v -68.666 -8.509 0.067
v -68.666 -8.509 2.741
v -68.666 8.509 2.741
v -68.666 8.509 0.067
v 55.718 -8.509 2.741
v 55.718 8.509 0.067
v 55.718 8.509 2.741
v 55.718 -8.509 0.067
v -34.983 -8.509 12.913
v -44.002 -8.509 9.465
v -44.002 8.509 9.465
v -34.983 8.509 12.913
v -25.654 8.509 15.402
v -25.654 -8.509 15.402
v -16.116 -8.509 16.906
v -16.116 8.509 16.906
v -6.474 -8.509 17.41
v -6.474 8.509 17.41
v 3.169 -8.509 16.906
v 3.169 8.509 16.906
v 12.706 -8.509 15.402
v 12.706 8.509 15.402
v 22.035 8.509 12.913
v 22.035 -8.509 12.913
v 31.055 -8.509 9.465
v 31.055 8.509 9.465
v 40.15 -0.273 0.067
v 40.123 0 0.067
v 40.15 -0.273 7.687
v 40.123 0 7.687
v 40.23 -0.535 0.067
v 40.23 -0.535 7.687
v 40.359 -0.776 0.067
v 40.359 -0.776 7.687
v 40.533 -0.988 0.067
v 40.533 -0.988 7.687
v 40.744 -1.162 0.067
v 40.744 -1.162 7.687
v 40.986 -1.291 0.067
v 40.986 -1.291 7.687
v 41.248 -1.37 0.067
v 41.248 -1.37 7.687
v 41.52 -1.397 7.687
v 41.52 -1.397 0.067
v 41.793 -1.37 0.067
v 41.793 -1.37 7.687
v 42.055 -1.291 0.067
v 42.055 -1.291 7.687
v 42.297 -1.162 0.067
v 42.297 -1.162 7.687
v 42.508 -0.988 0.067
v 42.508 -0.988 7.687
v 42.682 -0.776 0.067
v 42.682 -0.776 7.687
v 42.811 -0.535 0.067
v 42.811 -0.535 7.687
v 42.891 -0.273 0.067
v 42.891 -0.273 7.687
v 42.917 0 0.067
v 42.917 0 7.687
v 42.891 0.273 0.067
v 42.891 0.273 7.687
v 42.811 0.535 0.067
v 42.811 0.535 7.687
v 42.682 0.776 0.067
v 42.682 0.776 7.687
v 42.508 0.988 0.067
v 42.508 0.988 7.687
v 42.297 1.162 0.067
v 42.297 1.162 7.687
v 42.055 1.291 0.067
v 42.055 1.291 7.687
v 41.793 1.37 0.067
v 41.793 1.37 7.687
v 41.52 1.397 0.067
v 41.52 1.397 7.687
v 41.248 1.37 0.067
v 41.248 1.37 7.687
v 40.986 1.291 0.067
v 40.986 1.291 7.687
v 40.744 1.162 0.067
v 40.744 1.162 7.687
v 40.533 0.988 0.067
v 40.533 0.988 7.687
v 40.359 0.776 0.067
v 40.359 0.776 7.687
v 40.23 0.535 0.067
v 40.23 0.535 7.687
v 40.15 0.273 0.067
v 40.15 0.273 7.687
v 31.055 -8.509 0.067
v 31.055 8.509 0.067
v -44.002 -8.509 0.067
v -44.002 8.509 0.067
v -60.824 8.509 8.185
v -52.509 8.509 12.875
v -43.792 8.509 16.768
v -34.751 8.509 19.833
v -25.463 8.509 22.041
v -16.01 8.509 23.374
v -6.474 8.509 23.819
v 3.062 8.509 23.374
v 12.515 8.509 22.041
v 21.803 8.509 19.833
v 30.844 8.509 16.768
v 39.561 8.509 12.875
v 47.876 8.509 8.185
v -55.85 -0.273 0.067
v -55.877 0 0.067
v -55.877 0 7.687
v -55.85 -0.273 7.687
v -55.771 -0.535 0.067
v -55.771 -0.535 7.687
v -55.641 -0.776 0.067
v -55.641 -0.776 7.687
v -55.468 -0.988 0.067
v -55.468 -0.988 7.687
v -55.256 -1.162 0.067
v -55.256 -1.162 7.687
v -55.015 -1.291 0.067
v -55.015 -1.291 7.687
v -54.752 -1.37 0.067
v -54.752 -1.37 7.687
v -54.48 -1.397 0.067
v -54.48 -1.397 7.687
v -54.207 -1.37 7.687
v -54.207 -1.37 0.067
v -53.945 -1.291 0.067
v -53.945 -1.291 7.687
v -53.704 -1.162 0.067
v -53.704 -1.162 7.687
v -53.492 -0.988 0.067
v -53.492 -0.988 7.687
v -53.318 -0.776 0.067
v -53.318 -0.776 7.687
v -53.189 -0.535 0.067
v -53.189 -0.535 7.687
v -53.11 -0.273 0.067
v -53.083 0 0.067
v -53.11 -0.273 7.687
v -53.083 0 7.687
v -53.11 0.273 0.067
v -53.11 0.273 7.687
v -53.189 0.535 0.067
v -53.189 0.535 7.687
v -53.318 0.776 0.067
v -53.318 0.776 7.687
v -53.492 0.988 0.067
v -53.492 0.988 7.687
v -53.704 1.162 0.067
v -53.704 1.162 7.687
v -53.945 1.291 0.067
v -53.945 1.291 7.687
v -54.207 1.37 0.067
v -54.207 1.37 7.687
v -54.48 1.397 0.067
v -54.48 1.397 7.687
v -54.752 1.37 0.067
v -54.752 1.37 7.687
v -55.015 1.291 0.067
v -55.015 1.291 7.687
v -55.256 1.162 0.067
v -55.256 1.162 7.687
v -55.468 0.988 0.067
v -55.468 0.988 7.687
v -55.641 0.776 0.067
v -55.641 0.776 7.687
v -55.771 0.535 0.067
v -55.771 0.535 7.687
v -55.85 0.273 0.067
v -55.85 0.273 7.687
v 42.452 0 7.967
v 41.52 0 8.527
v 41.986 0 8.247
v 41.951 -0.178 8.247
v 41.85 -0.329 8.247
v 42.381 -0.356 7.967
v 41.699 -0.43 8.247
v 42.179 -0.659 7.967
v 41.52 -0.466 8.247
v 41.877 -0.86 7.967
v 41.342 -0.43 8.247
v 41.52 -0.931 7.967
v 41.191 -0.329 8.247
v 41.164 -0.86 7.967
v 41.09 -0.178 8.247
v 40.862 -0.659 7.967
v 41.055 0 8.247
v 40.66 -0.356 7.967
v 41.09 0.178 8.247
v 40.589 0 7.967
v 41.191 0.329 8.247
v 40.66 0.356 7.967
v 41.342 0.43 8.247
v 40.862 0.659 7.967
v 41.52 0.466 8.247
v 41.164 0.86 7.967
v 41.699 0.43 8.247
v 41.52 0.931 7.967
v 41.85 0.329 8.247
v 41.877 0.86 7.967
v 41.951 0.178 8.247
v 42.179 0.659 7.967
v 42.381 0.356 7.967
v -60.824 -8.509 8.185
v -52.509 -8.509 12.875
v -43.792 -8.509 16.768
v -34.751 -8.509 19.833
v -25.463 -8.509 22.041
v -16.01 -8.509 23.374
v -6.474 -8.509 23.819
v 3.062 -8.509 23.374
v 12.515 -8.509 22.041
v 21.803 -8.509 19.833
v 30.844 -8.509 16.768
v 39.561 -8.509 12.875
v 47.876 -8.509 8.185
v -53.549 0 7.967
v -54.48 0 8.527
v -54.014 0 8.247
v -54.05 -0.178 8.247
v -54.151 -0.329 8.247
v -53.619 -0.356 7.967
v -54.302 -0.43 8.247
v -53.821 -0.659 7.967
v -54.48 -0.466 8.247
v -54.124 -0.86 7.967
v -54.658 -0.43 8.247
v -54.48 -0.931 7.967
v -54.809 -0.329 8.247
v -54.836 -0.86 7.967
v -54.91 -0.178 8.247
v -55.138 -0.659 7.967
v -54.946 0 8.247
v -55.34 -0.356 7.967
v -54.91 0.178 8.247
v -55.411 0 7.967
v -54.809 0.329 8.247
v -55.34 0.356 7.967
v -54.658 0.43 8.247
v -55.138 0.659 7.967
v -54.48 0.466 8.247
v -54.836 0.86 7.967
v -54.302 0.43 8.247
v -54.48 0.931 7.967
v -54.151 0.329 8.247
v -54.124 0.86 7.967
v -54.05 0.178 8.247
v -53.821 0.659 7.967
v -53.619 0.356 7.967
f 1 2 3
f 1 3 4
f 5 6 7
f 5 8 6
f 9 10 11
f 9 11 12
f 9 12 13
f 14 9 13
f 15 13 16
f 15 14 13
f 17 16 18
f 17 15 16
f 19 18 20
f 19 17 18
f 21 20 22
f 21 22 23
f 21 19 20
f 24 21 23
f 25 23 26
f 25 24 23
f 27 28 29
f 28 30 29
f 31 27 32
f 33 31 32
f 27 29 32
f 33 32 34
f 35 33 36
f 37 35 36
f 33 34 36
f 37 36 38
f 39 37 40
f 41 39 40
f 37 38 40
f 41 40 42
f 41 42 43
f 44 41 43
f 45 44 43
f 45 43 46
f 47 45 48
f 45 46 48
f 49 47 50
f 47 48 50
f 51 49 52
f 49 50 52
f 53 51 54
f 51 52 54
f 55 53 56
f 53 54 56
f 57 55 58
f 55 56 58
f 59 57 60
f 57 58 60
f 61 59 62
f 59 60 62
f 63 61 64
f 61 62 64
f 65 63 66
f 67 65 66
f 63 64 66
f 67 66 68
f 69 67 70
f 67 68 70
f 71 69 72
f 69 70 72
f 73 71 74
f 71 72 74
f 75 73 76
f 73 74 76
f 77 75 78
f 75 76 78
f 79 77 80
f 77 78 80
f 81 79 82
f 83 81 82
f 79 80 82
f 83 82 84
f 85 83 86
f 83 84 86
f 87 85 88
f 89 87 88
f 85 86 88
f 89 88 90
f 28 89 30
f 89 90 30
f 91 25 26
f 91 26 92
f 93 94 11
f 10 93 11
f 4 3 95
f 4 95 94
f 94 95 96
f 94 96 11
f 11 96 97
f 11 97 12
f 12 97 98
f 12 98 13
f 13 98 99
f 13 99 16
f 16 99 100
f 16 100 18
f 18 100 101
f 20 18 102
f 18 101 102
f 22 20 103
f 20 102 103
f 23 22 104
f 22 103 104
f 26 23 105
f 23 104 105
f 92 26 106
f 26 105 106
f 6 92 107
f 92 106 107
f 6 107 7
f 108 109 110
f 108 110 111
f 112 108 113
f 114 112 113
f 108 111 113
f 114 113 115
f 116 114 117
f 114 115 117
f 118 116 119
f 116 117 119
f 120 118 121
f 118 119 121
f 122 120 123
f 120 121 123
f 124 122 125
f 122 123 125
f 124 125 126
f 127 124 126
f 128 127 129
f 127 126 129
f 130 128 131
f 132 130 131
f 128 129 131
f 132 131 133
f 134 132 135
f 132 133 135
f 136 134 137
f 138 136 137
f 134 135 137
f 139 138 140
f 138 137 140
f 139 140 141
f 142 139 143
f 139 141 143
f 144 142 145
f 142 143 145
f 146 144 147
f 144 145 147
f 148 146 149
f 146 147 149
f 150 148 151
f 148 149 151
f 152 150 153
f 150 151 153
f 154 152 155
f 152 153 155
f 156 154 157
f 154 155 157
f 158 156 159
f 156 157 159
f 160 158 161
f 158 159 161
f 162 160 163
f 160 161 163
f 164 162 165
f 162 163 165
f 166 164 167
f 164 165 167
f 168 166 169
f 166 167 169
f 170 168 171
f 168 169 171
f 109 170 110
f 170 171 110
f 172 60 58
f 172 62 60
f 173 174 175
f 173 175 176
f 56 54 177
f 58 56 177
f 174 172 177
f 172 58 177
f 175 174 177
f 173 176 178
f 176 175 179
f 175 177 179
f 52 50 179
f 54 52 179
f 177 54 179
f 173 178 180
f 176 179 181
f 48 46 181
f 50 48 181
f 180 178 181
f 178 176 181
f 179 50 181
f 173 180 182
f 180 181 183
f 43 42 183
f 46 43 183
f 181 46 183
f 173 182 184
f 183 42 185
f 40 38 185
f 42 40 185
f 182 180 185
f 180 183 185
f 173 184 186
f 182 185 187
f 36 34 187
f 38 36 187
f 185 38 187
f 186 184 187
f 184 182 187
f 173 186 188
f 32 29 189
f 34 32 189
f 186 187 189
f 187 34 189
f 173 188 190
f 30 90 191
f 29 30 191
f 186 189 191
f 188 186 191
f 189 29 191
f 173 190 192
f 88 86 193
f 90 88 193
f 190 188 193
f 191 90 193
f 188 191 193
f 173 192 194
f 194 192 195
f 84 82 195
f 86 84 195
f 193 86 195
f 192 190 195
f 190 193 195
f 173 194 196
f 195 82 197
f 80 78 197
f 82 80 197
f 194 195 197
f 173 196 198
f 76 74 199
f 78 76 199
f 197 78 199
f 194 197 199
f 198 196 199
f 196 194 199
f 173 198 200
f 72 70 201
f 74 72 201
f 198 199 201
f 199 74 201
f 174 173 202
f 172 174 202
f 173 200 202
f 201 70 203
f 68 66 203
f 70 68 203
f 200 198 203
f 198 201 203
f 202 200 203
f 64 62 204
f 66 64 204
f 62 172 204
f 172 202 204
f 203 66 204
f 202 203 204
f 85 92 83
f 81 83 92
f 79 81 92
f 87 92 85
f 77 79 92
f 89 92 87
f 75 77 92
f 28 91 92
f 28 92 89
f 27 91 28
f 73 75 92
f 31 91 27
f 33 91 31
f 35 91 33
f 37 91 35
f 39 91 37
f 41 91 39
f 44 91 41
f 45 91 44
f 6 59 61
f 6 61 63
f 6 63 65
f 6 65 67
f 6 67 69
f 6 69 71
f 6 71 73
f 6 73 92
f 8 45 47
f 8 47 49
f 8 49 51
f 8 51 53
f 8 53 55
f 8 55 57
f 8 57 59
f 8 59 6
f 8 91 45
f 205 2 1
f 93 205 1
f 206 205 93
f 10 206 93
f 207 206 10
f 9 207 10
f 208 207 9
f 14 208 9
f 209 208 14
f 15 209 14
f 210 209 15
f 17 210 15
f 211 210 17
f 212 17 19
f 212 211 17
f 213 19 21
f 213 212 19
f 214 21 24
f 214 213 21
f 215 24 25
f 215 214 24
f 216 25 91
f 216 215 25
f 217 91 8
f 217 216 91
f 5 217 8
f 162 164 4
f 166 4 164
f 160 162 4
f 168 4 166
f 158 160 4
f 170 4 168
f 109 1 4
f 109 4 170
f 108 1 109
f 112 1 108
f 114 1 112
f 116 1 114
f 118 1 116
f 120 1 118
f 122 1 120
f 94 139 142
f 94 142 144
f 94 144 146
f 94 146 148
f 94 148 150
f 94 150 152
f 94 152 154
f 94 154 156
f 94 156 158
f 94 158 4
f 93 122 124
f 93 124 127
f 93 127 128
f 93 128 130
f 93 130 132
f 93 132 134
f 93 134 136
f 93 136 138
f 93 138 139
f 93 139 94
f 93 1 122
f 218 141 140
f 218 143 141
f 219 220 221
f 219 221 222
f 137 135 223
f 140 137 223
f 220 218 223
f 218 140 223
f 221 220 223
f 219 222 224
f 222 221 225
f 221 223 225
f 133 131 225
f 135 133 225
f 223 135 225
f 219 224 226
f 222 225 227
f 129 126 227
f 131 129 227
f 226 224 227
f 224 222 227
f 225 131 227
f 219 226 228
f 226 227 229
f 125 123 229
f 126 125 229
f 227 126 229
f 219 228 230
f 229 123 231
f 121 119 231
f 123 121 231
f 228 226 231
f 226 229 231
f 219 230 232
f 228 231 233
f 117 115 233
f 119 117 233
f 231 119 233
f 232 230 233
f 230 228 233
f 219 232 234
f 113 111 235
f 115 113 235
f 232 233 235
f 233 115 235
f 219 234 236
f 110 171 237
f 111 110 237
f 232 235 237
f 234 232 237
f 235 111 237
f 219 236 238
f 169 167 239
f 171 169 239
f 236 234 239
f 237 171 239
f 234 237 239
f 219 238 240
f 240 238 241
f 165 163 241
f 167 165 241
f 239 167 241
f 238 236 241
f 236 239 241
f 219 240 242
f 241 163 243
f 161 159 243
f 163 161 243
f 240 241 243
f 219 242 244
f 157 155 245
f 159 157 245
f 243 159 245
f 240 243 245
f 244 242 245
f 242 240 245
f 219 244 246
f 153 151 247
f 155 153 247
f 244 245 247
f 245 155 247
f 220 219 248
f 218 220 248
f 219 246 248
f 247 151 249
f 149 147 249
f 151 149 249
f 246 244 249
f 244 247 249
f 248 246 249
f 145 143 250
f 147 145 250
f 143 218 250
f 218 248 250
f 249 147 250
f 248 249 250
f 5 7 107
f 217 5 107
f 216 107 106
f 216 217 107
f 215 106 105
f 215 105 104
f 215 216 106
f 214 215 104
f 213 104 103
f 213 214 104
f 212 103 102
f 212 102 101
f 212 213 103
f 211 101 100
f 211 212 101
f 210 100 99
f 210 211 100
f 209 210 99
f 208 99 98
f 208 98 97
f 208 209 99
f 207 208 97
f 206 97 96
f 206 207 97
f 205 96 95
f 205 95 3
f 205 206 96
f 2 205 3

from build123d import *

# Parameters (mm, degrees)
F2_DEPTH   = 8.509
F4_D       = 2.794
F4_DEPTH   = 7.62
F4_START   = 0.0673694
F4_START_2 = 0.0673774
F4_TIP     = 0.8394022848


with BuildPart() as f2:
    # F0 (on Front) → F2 (new body, symmetric)
    with BuildSketch(Plane.XZ):
        with BuildLine():
            ThreePointArc((55.7179713222, -8.0797821716), (-6.4739286778, 12.9986083689), (-68.6658286778, -8.0797821716))
            Line((-68.6658286778, -8.0797821716), (-68.6658286778, -10.7530225501))
            Line((-68.6658286778, -10.7530225501), (-44.0024286778, -10.7530225501))
            Line((-44.0024286778, -10.7530225501), (-44.0024286778, -1.3550225501))
            ThreePointArc((-44.0024286778, -1.3550225501), (-6.4739278287, 6.5894008462), (31.0545713222, -1.3550305716))
            Line((31.0545713222, -1.3550305716), (31.0545713222, -10.7530305716))
            Line((31.0545713222, -10.7530305716), (55.7179713222, -10.7530305716))
            Line((55.7179713222, -10.7530305716), (55.7179713222, -8.0797821716))
        make_face()
    extrude(amount=F2_DEPTH, both=True)


with BuildPart() as f2_1:
    # F3: moved
    add(f2.part.moved(Location((0, 0, 10.8204))))

    # F4
    # its depths count from where the whole tool has entered the part; down to there all is cleared
    with Locations(Plane(origin=(0, 0, 0), x_dir=(1, 0, 0), z_dir=(0, 0, -1))):
        with Locations((-54.4799286778, 0, -F4_START_2), (41.5204335099, 0, -F4_START)):
            Hole(F4_D / 2, depth=F4_DEPTH)
            with Locations((0, 0, -(F4_DEPTH + F4_TIP / 2))):  # 118° drill point
                Cone(0, F4_D / 2, F4_TIP, mode=Mode.SUBTRACT)


solid = f2_1.part
